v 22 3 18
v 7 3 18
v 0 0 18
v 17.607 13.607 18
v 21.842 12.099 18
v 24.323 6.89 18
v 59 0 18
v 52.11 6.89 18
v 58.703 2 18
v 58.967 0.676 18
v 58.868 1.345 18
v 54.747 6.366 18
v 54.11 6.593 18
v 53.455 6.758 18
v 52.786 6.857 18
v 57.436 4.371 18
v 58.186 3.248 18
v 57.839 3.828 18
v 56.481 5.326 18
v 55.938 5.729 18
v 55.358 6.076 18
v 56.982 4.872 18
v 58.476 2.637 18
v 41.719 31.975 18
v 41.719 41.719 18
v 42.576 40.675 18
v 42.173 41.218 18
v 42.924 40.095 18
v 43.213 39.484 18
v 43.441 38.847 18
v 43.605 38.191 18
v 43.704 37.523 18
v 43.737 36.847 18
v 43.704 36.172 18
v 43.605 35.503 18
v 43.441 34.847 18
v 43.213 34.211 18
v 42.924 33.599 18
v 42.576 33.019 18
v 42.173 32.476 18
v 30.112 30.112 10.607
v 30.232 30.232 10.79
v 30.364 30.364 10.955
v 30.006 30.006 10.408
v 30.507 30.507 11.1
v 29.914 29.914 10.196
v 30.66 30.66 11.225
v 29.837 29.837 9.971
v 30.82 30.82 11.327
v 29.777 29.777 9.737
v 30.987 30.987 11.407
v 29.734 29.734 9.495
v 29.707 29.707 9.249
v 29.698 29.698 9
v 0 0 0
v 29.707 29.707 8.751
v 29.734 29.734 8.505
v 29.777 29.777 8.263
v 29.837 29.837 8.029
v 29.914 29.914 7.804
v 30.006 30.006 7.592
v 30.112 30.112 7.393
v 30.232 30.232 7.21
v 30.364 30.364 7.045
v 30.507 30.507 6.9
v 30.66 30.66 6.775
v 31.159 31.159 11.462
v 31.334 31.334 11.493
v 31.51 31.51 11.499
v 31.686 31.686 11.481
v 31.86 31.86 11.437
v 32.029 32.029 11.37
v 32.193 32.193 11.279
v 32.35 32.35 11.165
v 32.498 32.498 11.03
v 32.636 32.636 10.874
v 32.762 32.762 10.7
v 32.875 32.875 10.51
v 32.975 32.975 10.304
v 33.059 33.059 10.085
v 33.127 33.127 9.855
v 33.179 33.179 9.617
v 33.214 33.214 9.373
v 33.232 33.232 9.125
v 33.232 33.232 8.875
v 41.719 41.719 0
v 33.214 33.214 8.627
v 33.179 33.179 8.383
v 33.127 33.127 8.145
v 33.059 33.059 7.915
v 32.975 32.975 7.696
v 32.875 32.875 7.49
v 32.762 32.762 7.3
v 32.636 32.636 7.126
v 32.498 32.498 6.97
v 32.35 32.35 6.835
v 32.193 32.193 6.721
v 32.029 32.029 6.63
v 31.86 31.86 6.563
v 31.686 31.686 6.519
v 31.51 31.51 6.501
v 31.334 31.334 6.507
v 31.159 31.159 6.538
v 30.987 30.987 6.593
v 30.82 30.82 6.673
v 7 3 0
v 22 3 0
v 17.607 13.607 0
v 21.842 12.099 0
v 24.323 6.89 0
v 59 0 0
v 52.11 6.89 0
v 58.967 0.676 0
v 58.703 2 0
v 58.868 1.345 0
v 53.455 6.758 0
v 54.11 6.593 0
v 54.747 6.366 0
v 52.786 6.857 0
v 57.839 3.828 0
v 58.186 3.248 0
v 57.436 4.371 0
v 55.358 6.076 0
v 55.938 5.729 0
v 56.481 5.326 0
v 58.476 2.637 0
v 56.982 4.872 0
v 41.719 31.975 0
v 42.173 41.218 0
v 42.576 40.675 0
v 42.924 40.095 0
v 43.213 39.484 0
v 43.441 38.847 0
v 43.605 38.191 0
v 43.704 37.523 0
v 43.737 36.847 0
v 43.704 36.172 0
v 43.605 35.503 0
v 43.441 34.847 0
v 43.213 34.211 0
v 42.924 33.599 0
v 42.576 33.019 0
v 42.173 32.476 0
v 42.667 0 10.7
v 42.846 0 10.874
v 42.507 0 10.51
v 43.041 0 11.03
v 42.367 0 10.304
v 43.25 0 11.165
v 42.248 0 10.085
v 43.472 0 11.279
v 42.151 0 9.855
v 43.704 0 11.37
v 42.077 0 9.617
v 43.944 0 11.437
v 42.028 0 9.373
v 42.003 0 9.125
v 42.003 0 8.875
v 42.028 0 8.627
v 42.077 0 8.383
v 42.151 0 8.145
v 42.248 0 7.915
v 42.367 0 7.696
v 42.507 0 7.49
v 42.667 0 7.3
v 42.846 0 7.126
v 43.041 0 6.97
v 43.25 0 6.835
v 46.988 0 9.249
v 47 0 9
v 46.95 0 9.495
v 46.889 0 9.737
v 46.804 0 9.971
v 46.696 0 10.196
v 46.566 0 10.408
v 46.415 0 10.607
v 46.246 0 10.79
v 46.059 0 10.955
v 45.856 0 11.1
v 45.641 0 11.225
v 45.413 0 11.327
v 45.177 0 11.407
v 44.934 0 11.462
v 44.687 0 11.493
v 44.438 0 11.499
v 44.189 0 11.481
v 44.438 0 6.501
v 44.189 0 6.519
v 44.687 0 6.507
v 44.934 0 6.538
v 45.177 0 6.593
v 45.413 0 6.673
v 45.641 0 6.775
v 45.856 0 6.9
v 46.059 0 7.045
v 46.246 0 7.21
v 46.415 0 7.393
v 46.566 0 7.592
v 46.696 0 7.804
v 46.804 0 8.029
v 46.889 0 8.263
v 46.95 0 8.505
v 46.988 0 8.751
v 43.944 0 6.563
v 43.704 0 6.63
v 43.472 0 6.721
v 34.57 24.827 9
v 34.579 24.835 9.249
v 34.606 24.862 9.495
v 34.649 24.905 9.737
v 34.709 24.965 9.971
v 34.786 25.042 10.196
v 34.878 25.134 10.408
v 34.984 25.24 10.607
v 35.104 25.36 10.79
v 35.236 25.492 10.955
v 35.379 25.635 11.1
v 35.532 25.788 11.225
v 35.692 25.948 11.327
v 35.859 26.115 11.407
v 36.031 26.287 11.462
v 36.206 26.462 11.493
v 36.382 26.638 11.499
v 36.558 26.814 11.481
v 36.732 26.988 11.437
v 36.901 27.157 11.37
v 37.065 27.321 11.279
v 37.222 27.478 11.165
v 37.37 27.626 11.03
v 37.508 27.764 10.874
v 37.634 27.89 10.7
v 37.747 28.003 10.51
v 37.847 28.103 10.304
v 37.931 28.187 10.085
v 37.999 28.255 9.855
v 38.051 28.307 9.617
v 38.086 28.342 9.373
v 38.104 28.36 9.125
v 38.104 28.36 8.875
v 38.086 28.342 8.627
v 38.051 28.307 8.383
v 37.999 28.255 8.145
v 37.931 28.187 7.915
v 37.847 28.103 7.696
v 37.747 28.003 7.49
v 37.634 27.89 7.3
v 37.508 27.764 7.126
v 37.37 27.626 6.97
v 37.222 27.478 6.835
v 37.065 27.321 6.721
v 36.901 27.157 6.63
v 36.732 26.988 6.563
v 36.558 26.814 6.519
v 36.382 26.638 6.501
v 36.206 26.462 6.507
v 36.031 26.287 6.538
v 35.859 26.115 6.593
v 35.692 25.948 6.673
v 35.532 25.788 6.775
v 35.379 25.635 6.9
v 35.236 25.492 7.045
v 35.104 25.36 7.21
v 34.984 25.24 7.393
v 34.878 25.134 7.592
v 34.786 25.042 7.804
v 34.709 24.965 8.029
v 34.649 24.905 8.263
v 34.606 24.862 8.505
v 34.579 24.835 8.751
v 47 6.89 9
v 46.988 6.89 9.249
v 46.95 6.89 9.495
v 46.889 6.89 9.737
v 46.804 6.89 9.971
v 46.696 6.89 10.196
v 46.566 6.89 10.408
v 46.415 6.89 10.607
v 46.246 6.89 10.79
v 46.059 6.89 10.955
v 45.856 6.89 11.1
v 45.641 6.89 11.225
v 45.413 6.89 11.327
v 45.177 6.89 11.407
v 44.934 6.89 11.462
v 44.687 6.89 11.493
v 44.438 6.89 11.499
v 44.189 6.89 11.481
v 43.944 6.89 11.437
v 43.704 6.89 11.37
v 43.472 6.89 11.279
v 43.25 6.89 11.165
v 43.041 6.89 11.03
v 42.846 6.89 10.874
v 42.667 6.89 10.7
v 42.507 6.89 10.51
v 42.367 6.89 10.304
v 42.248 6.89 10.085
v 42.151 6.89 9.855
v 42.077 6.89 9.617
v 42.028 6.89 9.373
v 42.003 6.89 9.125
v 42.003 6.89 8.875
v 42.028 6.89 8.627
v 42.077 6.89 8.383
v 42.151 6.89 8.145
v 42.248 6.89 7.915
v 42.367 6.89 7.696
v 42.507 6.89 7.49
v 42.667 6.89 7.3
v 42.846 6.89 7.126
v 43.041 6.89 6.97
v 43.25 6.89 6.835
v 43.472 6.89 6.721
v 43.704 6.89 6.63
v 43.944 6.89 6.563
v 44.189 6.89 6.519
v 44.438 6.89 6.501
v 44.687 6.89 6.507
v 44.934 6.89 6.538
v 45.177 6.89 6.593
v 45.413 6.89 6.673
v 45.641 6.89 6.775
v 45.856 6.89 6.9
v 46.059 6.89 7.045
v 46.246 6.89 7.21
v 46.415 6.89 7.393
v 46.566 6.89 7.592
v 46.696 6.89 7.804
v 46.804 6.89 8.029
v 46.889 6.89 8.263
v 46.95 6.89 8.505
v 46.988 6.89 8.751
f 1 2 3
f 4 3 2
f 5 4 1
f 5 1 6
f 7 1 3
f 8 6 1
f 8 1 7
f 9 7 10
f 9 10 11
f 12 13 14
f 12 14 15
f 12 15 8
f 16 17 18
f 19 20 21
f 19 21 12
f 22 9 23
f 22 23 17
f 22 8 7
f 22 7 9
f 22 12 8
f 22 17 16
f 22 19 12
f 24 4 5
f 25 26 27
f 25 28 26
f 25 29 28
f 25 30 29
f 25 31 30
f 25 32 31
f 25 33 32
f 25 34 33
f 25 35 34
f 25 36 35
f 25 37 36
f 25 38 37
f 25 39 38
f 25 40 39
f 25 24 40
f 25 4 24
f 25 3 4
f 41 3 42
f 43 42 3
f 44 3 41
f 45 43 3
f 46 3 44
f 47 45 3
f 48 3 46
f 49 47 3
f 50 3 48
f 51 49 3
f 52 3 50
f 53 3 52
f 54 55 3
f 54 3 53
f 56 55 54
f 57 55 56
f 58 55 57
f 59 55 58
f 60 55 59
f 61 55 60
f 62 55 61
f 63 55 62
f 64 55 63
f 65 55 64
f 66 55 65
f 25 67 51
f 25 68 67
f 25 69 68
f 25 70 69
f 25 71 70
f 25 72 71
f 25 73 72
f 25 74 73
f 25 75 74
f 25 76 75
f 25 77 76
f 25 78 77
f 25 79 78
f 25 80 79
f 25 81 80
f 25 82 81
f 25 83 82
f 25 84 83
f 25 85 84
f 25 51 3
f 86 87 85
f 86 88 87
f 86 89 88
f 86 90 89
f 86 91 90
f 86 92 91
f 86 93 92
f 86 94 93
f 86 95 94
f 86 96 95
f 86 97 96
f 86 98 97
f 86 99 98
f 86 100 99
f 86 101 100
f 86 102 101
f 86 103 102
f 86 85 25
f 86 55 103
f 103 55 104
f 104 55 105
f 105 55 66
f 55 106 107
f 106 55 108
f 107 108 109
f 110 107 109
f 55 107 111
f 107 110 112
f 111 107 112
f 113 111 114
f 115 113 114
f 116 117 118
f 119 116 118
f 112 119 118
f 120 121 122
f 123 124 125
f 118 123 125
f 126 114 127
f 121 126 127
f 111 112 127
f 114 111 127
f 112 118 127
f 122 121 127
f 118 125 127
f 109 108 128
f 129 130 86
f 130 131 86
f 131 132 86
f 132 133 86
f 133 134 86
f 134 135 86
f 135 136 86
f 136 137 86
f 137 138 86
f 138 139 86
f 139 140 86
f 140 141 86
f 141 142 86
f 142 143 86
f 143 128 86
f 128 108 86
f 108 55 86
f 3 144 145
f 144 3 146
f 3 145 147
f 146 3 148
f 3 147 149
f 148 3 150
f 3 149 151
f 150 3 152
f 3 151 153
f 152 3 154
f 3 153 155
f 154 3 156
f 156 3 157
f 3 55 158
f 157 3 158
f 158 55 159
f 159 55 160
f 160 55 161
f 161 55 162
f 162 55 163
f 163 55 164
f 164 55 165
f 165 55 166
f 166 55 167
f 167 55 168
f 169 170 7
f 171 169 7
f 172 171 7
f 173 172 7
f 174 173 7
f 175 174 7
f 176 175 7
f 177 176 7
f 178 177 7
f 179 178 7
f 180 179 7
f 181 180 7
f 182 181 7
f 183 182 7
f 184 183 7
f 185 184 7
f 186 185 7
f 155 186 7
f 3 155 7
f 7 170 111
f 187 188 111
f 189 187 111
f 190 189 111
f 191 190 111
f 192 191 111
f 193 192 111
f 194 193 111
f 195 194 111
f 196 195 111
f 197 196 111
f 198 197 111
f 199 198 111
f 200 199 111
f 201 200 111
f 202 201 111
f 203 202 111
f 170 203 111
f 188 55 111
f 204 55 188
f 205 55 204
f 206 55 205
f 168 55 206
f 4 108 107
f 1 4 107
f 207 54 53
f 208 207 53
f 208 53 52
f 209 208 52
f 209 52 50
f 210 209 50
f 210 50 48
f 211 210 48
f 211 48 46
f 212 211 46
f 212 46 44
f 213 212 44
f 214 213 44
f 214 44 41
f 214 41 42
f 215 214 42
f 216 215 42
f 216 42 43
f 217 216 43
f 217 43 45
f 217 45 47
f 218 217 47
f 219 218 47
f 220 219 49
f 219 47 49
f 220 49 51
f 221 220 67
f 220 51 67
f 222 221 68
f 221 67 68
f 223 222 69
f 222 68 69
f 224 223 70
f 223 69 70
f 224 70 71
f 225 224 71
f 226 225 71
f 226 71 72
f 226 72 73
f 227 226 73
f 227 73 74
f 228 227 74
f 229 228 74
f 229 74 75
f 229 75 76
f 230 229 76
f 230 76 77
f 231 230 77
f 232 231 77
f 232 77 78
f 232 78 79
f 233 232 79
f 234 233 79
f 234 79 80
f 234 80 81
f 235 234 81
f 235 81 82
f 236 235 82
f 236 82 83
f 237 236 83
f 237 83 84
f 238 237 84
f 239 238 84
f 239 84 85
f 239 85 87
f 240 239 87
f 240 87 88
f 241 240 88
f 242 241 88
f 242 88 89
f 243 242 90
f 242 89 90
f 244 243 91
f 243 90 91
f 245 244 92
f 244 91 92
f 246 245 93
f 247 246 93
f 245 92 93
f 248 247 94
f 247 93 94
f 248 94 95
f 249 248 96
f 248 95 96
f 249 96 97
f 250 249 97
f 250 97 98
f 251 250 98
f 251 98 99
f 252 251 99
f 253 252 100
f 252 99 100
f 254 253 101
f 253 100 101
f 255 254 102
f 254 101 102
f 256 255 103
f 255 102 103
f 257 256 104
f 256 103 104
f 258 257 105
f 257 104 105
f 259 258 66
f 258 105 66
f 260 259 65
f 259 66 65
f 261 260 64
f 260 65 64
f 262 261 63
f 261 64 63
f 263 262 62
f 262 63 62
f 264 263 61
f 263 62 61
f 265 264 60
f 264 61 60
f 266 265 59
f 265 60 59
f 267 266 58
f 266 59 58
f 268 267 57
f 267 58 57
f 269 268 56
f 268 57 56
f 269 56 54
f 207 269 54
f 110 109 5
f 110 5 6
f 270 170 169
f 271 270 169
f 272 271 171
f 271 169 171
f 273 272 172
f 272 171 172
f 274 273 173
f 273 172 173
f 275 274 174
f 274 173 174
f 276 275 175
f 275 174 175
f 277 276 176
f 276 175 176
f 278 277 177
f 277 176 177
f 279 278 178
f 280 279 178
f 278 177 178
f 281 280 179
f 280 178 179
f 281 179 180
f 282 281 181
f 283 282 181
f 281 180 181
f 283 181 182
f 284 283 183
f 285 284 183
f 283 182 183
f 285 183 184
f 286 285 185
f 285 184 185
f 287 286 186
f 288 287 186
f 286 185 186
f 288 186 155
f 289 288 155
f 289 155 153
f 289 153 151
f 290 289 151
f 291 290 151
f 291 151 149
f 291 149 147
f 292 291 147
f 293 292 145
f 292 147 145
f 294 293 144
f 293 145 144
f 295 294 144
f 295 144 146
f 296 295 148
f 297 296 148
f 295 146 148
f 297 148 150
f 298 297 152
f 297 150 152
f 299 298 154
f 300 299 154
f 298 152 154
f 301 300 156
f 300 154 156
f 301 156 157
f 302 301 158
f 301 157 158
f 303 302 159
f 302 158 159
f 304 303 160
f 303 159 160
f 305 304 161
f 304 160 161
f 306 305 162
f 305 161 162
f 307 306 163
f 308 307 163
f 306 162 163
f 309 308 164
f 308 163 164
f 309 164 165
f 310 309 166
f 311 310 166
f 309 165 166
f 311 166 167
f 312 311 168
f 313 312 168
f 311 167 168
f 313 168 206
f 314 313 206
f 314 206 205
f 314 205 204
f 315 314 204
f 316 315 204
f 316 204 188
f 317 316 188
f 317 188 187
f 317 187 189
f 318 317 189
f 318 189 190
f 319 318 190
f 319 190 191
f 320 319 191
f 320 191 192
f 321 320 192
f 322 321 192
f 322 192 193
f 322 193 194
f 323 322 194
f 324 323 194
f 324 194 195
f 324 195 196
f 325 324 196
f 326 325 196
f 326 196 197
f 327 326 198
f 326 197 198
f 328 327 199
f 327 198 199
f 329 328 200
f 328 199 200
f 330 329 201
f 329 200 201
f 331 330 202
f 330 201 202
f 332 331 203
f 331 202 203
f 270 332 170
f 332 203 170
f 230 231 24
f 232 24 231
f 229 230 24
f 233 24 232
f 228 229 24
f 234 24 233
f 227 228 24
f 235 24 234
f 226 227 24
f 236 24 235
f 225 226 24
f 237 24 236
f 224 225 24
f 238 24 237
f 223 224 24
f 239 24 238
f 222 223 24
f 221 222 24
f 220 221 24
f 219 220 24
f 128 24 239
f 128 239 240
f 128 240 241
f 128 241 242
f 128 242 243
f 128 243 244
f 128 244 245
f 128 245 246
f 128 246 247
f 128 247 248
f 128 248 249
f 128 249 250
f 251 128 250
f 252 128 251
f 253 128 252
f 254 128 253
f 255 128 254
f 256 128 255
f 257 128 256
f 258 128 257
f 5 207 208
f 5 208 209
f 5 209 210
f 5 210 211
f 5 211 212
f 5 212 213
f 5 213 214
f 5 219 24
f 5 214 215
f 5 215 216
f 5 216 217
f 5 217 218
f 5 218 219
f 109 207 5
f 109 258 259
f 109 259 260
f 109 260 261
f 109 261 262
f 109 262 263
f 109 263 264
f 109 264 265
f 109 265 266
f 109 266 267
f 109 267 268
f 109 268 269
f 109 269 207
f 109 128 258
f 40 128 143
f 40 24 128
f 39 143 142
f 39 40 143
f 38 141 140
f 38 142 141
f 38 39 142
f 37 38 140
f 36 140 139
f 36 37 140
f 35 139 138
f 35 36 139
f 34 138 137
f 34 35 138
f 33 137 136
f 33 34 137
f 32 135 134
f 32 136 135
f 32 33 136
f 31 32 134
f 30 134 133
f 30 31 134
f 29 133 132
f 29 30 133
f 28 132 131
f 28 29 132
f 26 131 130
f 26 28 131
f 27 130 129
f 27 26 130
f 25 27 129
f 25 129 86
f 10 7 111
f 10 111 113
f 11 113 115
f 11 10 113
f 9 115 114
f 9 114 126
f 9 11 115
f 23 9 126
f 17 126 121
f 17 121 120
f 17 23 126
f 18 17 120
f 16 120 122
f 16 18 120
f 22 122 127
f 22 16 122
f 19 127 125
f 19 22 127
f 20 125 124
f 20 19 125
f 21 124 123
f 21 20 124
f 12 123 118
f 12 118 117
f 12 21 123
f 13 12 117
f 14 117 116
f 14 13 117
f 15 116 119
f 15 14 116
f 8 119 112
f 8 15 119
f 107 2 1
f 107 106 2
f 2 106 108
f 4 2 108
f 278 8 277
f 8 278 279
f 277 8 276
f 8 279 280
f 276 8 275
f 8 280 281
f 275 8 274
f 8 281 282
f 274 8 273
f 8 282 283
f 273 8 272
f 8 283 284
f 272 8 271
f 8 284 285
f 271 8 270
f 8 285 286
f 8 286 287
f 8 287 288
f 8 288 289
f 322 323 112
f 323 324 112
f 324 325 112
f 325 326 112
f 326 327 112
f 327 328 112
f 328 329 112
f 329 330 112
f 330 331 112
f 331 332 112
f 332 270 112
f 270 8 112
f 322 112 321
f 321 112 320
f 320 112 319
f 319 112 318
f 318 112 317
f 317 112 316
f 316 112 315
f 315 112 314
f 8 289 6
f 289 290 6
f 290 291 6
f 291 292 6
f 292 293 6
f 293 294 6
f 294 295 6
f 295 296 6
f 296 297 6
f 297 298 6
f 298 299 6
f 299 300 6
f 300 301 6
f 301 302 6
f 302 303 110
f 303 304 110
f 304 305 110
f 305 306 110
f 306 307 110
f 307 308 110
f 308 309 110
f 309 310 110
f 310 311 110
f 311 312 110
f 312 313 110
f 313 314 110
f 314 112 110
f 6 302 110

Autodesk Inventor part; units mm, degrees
ref_plane "YZ Plane" through (0, 0, 0) normal (1, 0, 0) x (0, 1, 0)
ref_plane "XZ Plane" through (0, 0, 0) normal (0, 1, 0) x (-1, 0, 0)
ref_plane "XY Plane" through (0, 0, 0) normal (0, 0, 1) x (1, 0, 0)
sketch "Sketch1" plane through (0, 0, 0) normal (0, 0, 1) x (1, 0, 0)
  line L0 (0, 0) -> (59, 0)
  line L1 (7, 3) -> (22, 3)
  line L2 (7, 3) -> (22, 3) construction
  line L3 (0, 0) -> (41.7193, 41.7193)
  line L4 (0, 0) -> (59, 0) construction
  line L5 (7, 3) -> (17.6066, 13.6066)
  line L6 (7, 3) -> (22, 3) construction
  line L7 (17.6066, 13.6066) -> (22, 3)
  line L8 (59, 0) -> (59, 6.89)
  line L9 (59, 6.89) -> (24, 6.89)
  line L10 (41.7193, 41.7193) -> (46.5913, 36.8473)
  line L11 (46.5913, 36.8473) -> (21.8425, 12.0986)
  line L12 (21.8425, 12.0986) -> (24.3232, 6.89)
  dimension "d0" = 59
  dimension "d1" = 15
  dimension "d3" = 59
  dimension "d4" = 45
  dimension "d5" = 15
  dimension "d6" = 45
  dimension "d7" = 6.89
  dimension "d8" = 35
  dimension "d10" = 6.89
  dimension "d11" = 35
extrude "Extrusion1" add sketch "Sketch1" along normal blind 18
sketch "Sketch2" plane through (0, 0, 18) normal (0, 0, 1) x (1, 0, 0)
  point P0 (0, 0)
fillet "Fillet1" radius 6.89 1 edges at (46.5913, 36.8473, 9)
fillet "Fillet2" radius 6.89 1 edges at (59, 6.89, 9)
sketch "Sketch3" plane through (24.3232, 6.89, 18) normal (0, 1, 0) x (1, 0, 0)
  point P0 (-24.3232, 18)
sketch "Sketch4" plane through (0, 0, 0) normal (0, -1, 0) x (1, 0, 0)
  point P0 (0, 0)
sketch "Sketch5" plane through (0, 0, 0) normal (0, -1, 0) x (1, 0, 0)
  circle A0 centre (44.5, 9) radius 2.5
  point P0 (0, 0)
  dimension "d16" = 5
extrude "Extrusion2" cut sketch "Sketch5" against normal blind 6.89
sketch "Sketch6" plane through (0, 0, 0) normal (-0.7071, 0.7071, 0) x (-0.7071, -0.7071, 0)
  circle A0 centre (-44.5, 9) radius 2.5
  point P0 (0, 0)
  dimension "d19" = 5
extrude "Extrusion3" cut sketch "Sketch6" against normal blind 6.89
properties part number "45 Degree Connector"
